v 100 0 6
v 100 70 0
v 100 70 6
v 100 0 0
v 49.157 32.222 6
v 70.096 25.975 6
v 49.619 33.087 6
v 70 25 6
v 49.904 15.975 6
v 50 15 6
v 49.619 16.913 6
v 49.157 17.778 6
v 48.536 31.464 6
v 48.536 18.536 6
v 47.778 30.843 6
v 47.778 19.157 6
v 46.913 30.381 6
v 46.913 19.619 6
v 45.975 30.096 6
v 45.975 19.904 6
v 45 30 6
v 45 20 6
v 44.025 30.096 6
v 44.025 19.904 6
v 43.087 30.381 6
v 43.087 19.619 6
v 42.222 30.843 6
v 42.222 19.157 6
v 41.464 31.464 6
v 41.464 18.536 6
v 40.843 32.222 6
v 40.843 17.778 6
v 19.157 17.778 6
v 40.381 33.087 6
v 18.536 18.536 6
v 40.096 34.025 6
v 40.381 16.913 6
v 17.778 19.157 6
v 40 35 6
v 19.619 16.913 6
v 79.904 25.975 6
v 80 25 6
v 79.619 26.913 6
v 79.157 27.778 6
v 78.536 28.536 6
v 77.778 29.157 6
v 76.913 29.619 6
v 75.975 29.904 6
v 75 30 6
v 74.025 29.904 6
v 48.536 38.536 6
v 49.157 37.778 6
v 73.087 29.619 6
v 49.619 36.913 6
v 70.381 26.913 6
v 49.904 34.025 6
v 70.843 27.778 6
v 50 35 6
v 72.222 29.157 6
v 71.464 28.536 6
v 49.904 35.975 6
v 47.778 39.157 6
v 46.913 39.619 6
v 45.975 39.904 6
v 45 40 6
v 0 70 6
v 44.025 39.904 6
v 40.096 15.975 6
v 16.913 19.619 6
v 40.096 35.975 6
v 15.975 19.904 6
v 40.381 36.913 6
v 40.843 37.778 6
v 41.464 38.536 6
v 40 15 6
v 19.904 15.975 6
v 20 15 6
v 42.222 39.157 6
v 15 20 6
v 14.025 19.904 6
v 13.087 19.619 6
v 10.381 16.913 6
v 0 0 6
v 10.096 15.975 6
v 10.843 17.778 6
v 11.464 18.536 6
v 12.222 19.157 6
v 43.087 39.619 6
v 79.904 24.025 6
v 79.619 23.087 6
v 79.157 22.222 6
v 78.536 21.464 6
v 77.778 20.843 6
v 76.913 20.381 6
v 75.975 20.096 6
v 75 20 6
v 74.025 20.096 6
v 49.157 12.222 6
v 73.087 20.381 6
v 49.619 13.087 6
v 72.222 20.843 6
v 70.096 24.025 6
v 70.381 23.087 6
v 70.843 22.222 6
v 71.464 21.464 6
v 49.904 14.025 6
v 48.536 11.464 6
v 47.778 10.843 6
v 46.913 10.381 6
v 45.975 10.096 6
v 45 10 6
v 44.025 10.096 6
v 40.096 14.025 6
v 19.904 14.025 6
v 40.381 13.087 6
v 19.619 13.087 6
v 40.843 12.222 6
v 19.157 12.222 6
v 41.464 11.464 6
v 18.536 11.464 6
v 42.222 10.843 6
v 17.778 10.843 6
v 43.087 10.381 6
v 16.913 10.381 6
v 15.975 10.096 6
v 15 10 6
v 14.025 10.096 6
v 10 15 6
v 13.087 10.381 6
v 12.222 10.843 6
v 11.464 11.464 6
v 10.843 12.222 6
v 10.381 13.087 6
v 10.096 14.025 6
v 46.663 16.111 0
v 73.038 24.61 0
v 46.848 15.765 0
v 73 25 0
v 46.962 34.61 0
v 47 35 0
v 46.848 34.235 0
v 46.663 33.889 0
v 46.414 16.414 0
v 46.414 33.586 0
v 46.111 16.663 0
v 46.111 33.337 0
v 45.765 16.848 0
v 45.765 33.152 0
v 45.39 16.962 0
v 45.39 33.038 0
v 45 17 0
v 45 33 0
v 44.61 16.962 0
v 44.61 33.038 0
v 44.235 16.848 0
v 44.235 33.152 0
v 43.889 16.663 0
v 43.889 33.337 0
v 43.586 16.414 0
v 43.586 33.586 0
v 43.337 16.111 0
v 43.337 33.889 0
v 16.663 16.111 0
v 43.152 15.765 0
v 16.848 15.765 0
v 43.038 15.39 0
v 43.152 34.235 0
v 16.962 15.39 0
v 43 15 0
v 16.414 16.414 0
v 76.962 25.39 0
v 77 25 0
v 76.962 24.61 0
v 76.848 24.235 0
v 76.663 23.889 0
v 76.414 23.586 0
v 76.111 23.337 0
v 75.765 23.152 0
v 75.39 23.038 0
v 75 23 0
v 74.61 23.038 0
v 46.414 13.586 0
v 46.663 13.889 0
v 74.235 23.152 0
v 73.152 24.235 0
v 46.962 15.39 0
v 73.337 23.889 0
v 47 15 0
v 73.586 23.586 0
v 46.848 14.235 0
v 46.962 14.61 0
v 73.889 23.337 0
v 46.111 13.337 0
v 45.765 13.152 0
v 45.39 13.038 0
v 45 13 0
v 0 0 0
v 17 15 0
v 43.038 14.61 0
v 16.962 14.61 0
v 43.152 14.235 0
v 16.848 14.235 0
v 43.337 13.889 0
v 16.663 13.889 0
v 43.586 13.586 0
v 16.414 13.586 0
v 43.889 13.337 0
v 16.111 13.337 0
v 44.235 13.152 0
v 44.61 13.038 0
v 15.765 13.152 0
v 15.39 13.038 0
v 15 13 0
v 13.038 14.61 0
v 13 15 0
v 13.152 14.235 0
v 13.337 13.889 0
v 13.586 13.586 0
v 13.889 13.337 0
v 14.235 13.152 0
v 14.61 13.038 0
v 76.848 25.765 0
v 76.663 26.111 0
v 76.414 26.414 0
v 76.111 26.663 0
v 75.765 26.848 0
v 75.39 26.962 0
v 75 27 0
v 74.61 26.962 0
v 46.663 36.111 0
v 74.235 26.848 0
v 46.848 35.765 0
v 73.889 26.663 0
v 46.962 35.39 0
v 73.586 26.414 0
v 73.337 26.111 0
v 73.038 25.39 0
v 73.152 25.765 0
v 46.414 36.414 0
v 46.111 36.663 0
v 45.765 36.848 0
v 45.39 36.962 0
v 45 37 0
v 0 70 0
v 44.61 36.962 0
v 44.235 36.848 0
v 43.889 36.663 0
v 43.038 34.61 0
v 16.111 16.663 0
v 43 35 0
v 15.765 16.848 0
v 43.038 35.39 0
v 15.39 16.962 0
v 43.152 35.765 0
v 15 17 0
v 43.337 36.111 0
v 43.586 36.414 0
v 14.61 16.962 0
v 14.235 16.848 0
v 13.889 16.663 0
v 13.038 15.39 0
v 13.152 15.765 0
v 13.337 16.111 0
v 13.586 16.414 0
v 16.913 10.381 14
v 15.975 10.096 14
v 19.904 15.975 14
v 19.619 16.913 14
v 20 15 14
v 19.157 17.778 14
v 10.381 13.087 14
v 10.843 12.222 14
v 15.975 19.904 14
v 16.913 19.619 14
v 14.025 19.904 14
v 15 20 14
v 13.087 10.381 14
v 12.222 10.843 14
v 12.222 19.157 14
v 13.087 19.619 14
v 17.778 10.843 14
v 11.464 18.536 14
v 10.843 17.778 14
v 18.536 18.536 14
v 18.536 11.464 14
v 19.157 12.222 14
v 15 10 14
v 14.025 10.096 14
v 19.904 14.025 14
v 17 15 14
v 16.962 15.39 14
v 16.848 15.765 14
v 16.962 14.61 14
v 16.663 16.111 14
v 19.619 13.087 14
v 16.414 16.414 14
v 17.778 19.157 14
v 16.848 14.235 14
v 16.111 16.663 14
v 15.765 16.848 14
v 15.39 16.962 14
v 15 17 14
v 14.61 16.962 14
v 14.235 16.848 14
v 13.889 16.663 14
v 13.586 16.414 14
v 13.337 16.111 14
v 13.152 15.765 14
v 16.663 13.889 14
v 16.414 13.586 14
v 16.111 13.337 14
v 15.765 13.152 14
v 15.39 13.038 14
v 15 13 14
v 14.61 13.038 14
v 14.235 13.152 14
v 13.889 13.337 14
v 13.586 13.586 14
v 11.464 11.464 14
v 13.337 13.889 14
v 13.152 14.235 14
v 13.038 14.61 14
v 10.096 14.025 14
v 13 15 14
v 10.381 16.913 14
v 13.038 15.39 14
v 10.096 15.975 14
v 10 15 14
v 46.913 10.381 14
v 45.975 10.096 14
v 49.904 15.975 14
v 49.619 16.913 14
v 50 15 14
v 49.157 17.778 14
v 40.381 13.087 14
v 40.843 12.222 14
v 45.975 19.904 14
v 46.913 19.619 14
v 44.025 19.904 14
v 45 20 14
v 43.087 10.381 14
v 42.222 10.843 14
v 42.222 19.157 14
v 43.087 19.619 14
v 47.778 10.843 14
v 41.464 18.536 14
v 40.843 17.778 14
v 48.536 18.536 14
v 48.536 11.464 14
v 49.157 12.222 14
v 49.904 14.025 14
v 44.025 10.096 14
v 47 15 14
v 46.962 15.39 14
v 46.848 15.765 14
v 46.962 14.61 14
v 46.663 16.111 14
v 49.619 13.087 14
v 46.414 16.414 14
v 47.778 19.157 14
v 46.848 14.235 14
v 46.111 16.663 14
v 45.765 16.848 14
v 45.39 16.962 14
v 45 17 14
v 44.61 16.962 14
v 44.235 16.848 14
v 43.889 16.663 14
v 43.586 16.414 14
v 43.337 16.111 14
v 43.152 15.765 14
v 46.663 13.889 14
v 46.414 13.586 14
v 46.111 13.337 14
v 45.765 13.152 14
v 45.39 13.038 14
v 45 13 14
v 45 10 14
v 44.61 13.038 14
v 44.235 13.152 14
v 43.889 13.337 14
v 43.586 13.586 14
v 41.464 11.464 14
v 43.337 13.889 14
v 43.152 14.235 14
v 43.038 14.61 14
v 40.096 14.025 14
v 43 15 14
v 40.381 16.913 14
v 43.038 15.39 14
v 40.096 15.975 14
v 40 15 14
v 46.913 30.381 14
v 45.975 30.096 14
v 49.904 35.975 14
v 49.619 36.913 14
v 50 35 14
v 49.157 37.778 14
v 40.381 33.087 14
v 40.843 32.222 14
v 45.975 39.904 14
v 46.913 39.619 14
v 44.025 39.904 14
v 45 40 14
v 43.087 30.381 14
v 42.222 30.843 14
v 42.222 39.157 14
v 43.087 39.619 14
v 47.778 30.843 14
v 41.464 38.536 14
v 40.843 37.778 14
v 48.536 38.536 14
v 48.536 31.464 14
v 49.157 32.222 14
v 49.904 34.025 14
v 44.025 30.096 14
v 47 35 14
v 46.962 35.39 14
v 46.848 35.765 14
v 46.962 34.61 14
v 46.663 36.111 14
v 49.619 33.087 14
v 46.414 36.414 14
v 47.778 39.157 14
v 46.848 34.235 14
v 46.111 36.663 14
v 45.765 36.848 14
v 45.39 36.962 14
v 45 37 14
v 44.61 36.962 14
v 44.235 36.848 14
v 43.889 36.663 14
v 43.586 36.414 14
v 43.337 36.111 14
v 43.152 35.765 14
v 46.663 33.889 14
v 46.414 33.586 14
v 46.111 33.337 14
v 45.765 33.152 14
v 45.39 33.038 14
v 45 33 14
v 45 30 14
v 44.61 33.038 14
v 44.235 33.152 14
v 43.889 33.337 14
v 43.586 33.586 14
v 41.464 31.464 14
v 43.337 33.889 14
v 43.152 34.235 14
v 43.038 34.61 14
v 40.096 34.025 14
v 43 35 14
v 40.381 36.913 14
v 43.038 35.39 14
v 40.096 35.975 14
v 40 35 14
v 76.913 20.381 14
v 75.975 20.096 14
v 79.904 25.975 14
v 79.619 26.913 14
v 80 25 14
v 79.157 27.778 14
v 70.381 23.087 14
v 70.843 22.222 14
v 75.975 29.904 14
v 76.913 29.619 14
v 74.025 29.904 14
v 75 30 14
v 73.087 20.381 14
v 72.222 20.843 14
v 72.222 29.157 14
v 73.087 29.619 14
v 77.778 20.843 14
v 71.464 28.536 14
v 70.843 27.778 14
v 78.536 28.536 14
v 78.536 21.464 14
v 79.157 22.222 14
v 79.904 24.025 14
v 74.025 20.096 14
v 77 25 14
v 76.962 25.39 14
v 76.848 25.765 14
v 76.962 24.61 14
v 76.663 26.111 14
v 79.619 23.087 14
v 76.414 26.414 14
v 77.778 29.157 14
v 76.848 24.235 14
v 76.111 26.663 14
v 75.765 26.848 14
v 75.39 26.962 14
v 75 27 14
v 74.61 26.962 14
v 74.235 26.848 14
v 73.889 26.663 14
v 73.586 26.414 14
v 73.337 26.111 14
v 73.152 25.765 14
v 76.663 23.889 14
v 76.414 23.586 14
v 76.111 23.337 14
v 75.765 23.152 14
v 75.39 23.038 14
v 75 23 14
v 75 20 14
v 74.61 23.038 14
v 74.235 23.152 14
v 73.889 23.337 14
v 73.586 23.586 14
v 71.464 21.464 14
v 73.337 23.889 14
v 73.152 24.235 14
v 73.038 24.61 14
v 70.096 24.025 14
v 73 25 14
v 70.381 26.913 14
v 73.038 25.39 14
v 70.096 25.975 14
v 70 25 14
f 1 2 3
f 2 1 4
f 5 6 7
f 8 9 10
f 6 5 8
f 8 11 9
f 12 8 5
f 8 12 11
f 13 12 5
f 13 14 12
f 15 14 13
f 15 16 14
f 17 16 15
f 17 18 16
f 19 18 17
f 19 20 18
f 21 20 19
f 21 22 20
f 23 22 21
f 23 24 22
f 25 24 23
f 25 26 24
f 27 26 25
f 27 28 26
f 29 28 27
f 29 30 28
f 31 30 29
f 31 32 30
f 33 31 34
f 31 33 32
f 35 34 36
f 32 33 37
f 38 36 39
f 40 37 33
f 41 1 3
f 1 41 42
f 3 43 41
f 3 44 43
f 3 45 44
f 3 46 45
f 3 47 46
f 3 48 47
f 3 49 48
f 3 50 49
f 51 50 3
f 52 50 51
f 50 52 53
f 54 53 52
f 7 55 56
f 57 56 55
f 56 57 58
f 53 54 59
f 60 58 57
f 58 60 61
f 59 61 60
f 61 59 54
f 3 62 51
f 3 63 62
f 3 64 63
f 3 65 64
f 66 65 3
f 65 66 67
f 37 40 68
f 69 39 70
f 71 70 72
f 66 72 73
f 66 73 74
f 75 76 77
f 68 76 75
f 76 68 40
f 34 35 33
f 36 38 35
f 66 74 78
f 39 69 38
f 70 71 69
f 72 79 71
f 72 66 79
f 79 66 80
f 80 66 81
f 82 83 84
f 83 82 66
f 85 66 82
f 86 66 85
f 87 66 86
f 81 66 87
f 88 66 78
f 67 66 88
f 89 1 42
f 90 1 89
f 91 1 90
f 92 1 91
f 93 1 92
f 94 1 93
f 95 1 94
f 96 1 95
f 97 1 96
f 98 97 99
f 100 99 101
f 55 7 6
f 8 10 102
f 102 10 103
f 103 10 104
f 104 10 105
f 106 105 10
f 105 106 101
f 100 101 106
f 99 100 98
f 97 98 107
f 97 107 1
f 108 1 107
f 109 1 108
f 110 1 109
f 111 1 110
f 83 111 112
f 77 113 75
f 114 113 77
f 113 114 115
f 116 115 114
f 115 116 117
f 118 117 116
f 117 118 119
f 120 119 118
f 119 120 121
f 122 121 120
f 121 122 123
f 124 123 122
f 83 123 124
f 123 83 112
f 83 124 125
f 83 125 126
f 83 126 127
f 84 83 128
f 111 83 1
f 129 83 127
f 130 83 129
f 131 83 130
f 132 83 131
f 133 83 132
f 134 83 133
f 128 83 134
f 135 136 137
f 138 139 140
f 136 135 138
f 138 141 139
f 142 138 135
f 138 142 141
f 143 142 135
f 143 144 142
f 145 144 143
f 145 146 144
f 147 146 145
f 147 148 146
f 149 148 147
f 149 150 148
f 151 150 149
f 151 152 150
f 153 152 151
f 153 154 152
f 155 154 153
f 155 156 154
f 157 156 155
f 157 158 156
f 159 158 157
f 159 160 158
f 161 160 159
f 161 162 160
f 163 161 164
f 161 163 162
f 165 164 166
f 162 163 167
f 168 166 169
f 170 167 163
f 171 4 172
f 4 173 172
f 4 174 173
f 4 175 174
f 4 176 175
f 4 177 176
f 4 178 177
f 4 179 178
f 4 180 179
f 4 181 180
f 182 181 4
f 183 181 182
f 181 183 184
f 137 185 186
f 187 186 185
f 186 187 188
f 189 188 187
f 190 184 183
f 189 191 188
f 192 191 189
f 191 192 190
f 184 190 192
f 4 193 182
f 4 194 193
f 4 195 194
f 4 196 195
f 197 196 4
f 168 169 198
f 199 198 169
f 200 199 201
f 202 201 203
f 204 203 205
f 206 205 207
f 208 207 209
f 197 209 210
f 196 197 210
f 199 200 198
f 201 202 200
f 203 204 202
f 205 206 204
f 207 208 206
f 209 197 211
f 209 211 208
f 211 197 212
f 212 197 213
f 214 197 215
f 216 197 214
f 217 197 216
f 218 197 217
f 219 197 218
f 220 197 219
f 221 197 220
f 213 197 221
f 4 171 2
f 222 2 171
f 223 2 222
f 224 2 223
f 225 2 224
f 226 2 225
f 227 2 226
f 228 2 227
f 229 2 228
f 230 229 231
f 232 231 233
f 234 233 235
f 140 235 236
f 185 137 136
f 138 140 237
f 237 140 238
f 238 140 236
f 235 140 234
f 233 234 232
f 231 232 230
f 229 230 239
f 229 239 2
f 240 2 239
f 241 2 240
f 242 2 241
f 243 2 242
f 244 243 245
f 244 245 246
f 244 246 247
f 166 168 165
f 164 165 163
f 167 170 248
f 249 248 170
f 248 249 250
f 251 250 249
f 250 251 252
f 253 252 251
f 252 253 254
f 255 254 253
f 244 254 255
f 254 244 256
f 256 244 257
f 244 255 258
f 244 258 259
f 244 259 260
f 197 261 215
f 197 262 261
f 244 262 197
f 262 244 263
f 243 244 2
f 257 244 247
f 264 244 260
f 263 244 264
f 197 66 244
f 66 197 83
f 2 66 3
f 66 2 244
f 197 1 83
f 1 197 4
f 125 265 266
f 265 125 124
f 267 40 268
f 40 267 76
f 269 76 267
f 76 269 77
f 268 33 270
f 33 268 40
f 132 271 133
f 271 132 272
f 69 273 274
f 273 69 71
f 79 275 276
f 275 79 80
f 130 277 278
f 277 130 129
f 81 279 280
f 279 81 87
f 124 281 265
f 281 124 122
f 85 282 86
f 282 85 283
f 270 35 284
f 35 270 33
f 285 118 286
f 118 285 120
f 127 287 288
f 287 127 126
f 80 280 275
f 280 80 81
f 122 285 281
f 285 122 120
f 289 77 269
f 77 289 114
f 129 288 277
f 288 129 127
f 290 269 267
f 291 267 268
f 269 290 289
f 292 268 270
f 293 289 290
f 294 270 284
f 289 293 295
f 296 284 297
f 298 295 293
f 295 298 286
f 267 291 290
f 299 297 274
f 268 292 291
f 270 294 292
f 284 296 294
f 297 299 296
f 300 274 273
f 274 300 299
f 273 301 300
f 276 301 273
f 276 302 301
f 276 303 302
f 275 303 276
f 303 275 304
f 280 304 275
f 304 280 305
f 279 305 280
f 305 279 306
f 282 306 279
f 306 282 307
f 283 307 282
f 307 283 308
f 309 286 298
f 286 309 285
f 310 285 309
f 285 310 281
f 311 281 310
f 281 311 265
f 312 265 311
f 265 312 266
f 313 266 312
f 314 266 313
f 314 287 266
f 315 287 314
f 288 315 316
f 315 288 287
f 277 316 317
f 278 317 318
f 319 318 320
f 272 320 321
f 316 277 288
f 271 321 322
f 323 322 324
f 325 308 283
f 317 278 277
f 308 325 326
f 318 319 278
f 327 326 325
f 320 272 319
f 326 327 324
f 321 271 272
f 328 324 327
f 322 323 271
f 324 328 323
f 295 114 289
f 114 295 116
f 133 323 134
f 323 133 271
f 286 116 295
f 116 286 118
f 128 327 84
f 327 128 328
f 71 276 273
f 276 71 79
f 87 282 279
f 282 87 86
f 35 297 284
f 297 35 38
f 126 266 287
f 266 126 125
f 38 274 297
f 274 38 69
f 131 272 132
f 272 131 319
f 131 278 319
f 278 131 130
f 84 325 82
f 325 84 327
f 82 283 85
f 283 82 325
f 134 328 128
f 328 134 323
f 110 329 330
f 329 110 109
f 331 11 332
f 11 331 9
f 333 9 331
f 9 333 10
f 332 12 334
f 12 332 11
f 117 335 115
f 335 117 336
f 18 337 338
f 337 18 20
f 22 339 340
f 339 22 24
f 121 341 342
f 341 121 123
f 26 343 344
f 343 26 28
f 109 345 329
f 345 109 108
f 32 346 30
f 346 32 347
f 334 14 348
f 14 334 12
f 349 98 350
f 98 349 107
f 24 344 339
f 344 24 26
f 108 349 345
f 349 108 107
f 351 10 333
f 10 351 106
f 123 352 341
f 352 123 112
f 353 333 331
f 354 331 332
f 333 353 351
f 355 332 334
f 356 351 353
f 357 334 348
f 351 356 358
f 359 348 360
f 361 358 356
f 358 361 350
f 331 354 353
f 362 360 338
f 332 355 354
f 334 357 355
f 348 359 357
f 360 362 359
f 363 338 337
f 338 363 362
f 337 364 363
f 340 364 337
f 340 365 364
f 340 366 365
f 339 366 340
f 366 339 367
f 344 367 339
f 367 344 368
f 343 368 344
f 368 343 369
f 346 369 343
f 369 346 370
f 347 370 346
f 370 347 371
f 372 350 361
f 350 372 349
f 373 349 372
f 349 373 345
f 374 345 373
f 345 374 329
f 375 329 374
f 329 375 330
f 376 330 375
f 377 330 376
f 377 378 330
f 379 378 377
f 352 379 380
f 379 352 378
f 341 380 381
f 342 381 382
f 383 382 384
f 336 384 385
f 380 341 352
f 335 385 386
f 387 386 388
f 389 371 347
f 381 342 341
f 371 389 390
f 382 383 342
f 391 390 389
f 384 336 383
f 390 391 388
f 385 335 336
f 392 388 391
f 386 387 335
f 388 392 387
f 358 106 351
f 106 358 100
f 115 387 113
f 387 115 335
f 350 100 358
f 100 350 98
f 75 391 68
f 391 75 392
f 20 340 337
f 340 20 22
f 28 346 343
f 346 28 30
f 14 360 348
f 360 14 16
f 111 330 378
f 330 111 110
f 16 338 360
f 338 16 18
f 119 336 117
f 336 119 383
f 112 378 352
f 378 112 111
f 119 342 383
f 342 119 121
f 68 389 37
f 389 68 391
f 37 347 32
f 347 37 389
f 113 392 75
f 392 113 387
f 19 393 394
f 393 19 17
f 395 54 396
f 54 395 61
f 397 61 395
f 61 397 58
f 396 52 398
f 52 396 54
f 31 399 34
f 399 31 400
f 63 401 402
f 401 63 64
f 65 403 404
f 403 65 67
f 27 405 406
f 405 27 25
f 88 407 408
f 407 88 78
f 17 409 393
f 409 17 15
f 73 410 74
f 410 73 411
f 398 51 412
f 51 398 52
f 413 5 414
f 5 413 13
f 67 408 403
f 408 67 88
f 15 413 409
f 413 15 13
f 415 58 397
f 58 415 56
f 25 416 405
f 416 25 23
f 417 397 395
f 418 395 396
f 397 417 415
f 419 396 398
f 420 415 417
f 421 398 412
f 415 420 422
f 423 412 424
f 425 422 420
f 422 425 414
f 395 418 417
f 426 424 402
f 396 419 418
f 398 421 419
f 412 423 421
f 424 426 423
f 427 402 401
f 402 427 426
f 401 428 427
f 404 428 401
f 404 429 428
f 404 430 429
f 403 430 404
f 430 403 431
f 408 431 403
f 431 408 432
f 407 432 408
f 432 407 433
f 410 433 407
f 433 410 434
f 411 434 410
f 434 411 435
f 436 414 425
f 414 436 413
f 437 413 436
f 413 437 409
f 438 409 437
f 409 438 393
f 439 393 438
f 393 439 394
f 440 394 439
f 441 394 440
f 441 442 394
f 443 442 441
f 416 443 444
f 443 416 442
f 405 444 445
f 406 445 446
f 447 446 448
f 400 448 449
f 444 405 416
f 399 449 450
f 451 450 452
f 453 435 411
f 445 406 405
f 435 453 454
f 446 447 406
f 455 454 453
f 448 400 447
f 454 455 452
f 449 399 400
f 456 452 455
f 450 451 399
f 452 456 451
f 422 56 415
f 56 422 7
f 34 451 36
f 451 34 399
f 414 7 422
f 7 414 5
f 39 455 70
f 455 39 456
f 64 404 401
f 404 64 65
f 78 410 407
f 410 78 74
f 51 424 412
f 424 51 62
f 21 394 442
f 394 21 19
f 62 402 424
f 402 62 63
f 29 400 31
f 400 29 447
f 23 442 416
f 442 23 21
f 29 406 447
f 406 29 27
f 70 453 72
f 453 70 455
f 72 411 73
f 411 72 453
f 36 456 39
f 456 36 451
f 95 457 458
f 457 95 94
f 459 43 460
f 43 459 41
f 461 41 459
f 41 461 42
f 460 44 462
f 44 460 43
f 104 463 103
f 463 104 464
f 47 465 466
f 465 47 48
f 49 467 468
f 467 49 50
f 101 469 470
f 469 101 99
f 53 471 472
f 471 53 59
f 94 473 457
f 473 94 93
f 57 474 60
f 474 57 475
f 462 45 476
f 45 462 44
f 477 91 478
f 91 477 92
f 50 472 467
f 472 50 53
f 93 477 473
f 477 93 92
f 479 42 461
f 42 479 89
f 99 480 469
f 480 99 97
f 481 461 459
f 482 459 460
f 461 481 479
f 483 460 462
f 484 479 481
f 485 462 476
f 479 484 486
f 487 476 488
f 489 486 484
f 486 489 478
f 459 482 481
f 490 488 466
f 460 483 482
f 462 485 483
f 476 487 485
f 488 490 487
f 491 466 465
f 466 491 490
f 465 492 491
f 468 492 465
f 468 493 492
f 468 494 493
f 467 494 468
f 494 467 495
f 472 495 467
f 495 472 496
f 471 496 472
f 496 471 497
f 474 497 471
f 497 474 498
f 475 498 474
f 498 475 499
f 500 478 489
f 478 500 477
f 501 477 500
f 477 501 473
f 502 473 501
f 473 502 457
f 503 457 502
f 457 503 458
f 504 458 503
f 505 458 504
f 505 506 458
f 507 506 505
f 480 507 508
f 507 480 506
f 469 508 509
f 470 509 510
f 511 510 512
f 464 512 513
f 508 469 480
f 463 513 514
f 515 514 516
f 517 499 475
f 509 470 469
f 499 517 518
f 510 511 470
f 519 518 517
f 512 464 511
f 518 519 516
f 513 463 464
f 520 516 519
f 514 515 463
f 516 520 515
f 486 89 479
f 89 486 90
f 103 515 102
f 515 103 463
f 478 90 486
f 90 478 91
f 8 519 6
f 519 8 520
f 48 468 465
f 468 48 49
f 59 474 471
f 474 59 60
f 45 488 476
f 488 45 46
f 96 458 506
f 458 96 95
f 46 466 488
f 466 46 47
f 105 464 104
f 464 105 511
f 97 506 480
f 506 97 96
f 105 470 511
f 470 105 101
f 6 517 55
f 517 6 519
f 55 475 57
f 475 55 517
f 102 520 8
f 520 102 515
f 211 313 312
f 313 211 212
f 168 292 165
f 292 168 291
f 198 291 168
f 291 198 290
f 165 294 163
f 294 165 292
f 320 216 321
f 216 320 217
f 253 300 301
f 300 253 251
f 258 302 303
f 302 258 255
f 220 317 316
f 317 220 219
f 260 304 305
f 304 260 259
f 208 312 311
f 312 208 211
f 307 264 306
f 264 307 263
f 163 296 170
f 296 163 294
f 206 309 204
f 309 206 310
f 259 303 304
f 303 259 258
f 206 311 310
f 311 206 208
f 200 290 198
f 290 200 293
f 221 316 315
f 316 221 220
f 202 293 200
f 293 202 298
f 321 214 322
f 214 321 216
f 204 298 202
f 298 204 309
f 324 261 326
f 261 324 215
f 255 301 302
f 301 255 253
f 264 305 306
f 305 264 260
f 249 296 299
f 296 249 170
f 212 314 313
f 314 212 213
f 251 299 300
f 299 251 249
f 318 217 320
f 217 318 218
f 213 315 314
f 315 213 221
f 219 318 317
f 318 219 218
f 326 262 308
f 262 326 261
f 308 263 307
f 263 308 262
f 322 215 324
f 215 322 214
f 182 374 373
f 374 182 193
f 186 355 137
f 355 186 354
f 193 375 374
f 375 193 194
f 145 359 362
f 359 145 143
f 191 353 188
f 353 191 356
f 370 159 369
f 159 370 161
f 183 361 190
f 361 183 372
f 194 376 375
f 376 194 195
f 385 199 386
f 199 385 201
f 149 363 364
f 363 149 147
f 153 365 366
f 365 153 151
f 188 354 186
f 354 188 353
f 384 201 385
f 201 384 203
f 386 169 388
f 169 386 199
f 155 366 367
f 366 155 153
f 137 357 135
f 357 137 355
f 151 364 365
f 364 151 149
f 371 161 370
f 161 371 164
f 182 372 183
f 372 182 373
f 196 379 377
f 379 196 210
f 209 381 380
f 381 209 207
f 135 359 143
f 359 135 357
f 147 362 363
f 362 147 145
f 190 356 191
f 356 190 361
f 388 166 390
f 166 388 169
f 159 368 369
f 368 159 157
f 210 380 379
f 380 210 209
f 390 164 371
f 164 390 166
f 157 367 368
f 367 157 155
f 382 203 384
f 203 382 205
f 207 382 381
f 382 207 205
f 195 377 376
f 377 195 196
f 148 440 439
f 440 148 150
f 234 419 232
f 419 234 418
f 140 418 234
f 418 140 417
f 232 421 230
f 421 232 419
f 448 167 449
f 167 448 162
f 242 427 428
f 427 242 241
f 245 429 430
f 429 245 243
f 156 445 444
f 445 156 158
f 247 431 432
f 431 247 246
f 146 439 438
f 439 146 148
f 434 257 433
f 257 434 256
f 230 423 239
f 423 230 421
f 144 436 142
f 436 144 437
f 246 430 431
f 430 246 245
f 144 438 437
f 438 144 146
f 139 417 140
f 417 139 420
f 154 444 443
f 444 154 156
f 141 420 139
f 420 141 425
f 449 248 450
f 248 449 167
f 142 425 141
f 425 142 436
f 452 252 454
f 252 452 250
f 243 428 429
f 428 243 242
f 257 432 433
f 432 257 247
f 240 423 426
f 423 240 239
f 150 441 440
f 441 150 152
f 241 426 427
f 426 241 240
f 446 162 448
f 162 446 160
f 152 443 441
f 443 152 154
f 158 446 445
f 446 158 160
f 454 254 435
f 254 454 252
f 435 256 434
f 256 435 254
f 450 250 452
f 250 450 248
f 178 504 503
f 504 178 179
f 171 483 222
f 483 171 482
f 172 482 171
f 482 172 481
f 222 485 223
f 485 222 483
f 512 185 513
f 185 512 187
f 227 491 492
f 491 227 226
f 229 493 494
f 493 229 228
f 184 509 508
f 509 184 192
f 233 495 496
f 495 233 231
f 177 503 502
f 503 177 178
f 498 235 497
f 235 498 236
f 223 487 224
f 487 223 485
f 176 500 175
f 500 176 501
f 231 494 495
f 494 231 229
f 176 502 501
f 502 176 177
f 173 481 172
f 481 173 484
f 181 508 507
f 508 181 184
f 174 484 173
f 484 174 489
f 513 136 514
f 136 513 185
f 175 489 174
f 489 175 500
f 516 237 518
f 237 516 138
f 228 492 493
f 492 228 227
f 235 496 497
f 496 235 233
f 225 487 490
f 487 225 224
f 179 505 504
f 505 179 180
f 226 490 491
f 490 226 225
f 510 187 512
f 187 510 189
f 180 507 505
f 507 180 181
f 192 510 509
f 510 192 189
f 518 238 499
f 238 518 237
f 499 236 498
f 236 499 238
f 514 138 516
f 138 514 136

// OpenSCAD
$fn = 32;

// ----------------------------------------------------------------------
// Boss field: plate with bosses at given coordinates
// ----------------------------------------------------------------------

// --- parameters (mm) ---
plate_l = 100;            // plate length, X
plate_w = 70;             // plate width, Y
plate_t = 6;              // plate thickness, Z
boss_d = 10;              // boss diameter
boss_h = 8;               // boss height above the plate
bore_d = 4;               // boss bore

total_h = plate_t + boss_h;  // overall height

difference() {
  union() {
    cube([plate_l, plate_w, plate_t]);
    translate([15, 15, plate_t]) cylinder(h = boss_h, d = boss_d);
    translate([45, 15, plate_t]) cylinder(h = boss_h, d = boss_d);
    translate([45, 35, plate_t]) cylinder(h = boss_h, d = boss_d);
    translate([75, 25, plate_t]) cylinder(h = boss_h, d = boss_d);
  }
  translate([15, 15, -1]) cylinder(h = total_h + 2, d = bore_d);
  translate([45, 15, -1]) cylinder(h = total_h + 2, d = bore_d);
  translate([45, 35, -1]) cylinder(h = total_h + 2, d = bore_d);
  translate([75, 25, -1]) cylinder(h = total_h + 2, d = bore_d);
}
